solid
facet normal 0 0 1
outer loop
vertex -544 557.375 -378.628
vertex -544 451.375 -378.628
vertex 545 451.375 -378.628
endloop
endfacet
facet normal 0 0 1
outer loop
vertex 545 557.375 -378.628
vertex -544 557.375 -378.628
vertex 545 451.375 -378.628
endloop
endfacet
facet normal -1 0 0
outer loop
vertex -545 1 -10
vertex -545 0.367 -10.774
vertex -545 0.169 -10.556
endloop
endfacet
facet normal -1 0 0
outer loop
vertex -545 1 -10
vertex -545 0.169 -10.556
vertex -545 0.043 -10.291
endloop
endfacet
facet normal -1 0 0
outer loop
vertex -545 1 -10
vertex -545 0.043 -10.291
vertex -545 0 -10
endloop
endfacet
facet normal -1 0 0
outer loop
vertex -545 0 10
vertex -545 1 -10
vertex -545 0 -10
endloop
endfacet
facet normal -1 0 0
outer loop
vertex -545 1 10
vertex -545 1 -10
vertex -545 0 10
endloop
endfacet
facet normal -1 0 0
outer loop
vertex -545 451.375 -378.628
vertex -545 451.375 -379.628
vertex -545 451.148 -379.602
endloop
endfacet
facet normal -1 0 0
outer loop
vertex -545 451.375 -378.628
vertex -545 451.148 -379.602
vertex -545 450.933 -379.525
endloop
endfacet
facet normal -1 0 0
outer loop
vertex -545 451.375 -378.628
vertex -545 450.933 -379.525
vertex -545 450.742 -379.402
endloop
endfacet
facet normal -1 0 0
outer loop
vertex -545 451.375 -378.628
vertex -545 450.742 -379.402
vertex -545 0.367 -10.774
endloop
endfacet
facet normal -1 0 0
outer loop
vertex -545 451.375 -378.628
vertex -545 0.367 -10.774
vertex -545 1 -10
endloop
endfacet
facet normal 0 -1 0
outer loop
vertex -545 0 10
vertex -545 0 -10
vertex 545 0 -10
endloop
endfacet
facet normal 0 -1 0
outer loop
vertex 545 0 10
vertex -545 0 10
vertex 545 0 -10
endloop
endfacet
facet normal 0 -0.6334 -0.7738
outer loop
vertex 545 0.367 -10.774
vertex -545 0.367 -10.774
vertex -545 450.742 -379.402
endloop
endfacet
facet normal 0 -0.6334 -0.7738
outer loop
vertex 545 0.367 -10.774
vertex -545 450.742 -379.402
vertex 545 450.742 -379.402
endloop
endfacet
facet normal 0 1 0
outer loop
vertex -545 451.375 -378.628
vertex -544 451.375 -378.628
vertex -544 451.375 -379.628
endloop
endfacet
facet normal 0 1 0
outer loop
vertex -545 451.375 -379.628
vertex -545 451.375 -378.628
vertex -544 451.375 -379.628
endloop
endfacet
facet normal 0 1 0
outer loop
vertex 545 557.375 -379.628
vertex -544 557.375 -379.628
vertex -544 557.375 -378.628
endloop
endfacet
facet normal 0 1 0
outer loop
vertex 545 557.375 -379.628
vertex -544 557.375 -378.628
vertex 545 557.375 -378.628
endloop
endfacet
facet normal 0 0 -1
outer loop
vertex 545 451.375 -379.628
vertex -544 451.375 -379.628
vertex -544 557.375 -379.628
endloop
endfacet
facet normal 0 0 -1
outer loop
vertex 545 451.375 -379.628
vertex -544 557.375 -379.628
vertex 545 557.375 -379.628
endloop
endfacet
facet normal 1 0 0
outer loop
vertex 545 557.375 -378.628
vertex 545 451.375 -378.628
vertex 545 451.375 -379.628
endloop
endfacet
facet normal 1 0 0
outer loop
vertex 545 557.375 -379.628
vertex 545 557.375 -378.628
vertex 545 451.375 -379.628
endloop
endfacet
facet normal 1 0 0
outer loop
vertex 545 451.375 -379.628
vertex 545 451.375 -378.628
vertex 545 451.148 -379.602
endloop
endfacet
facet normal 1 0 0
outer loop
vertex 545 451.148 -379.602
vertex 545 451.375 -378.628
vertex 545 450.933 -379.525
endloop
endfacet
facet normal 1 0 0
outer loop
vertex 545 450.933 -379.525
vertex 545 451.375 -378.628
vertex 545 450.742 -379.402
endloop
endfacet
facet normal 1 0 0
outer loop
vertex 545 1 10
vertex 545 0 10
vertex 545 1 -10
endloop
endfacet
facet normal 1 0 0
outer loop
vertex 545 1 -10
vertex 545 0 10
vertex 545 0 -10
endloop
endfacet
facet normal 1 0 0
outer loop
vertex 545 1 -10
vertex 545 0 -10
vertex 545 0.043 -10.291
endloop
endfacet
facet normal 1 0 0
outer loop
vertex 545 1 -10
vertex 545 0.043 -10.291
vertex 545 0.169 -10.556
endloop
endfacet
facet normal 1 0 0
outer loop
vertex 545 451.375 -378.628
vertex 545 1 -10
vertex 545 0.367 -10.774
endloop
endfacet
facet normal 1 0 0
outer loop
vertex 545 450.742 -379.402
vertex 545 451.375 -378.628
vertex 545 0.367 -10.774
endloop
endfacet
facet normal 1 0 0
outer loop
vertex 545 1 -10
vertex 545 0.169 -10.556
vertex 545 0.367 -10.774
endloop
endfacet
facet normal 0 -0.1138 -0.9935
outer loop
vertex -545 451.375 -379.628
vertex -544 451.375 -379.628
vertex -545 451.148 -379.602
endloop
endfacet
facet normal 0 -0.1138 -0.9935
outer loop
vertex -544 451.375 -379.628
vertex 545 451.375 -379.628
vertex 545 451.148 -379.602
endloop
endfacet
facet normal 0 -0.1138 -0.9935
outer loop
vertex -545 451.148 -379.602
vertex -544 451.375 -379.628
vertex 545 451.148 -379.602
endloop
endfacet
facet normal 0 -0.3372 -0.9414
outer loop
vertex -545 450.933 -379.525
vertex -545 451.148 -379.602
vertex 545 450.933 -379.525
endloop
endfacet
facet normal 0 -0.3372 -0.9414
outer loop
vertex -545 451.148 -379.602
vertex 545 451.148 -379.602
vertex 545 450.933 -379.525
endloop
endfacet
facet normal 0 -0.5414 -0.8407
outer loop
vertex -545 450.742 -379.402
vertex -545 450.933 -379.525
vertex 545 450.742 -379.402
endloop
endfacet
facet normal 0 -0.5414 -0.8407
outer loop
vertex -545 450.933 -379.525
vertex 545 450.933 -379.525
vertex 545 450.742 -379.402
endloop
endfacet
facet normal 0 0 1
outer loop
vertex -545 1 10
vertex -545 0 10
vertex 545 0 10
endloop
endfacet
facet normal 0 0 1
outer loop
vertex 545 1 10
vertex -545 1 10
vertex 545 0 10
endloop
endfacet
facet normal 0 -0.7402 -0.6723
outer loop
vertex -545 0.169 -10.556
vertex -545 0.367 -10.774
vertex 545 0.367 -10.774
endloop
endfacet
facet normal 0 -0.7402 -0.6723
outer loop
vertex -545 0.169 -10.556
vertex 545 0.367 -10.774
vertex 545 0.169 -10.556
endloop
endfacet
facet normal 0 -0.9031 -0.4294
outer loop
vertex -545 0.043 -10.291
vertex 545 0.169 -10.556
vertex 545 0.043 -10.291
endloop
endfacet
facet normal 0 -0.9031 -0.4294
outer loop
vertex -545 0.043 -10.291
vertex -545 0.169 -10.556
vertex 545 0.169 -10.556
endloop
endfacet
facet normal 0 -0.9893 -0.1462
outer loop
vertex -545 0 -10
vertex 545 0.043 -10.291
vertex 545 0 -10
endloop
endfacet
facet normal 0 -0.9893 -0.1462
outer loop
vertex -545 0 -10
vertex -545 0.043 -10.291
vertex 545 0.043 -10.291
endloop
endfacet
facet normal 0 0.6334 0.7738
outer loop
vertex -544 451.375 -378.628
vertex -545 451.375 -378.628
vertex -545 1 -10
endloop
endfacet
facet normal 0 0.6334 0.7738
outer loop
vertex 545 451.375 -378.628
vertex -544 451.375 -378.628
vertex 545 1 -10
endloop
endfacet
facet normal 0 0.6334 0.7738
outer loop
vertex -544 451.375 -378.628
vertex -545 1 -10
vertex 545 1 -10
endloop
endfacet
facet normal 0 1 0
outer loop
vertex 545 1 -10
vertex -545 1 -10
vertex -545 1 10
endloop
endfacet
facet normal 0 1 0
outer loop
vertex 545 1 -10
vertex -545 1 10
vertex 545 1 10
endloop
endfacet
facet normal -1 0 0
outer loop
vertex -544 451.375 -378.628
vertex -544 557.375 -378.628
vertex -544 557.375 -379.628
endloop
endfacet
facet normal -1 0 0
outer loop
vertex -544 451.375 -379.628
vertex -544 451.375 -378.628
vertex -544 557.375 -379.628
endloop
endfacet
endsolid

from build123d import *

# Parameters (mm, degrees)
SKETCH1_W           = 1090
SKETCH1_H           = 20
BOSS_EXTRUDE1_DEPTH = 1
BOSS_EXTRUDE4_DEPTH = 1090
SKETCH5_W           = 1090
SKETCH5_H           = 1
BOSS_EXTRUDE5_DEPTH = 582
BOSS_EXTRUDE6_DEPTH = 1090
SKETCH7_W           = 1089
SKETCH7_H           = 1
BOSS_EXTRUDE7_DEPTH = 106


with BuildPart() as part:
    # Sketch1 → Boss-Extrude1 (new body)
    with BuildSketch(Plane(origin=(0, 0, 0), x_dir=(1, 0, 0), z_dir=(0, 1, 0))):
        Rectangle(SKETCH1_W, SKETCH1_H)
    extrude(amount=BOSS_EXTRUDE1_DEPTH)

    # Sketch4 → Boss-Extrude4 (add)
    with BuildSketch(Plane.ZY.offset(545)):
        with BuildLine():
            Line((-10, 1), (-10.77384021, 0.366619127))
            ThreePointArc((-10.77384021, 0.366619127), (-10.428146661, 0.096290735), (-10, 0))
            Line((-10, 0), (-10, 1))
        make_face()
    extrude(amount=-BOSS_EXTRUDE4_DEPTH)

    # Sketch5 → Boss-Extrude5 (add)
    with BuildSketch(Plane(origin=(0, 5.500184543, -4.501848885), x_dir=(1, 0, 0), z_dir=(0, 0.7738402097265024, -0.6333808726275547))):
        with Locations((0, 7.605021225)):
            Rectangle(SKETCH5_W, SKETCH5_H)
    extrude(amount=BOSS_EXTRUDE5_DEPTH)

    # Sketch6 → Boss-Extrude6 (add)
    with BuildSketch(Plane(origin=(545, 0, 0), x_dir=(0, 0, -1), z_dir=(1, 0, 0))):
        with BuildLine():
            Line((378.627667869, 451.375002061), (379.627667869, 451.375002061))
            ThreePointArc((379.627667869, 451.375002061), (379.569432227, 451.038728519), (379.401508079, 450.741621188))
            Line((379.401508079, 450.741621188), (378.627667869, 451.375002061))
        make_face()
    extrude(amount=-BOSS_EXTRUDE6_DEPTH)

    # Sketch7 → Boss-Extrude7 (add)
    with BuildSketch(Plane(origin=(0, 451.375002061, 0), x_dir=(1, 0, 0), z_dir=(0, 1, 0))):
        with Locations((0.5, 379.127667869)):
            Rectangle(SKETCH7_W, SKETCH7_H)
    extrude(amount=BOSS_EXTRUDE7_DEPTH)


solid = part.part
